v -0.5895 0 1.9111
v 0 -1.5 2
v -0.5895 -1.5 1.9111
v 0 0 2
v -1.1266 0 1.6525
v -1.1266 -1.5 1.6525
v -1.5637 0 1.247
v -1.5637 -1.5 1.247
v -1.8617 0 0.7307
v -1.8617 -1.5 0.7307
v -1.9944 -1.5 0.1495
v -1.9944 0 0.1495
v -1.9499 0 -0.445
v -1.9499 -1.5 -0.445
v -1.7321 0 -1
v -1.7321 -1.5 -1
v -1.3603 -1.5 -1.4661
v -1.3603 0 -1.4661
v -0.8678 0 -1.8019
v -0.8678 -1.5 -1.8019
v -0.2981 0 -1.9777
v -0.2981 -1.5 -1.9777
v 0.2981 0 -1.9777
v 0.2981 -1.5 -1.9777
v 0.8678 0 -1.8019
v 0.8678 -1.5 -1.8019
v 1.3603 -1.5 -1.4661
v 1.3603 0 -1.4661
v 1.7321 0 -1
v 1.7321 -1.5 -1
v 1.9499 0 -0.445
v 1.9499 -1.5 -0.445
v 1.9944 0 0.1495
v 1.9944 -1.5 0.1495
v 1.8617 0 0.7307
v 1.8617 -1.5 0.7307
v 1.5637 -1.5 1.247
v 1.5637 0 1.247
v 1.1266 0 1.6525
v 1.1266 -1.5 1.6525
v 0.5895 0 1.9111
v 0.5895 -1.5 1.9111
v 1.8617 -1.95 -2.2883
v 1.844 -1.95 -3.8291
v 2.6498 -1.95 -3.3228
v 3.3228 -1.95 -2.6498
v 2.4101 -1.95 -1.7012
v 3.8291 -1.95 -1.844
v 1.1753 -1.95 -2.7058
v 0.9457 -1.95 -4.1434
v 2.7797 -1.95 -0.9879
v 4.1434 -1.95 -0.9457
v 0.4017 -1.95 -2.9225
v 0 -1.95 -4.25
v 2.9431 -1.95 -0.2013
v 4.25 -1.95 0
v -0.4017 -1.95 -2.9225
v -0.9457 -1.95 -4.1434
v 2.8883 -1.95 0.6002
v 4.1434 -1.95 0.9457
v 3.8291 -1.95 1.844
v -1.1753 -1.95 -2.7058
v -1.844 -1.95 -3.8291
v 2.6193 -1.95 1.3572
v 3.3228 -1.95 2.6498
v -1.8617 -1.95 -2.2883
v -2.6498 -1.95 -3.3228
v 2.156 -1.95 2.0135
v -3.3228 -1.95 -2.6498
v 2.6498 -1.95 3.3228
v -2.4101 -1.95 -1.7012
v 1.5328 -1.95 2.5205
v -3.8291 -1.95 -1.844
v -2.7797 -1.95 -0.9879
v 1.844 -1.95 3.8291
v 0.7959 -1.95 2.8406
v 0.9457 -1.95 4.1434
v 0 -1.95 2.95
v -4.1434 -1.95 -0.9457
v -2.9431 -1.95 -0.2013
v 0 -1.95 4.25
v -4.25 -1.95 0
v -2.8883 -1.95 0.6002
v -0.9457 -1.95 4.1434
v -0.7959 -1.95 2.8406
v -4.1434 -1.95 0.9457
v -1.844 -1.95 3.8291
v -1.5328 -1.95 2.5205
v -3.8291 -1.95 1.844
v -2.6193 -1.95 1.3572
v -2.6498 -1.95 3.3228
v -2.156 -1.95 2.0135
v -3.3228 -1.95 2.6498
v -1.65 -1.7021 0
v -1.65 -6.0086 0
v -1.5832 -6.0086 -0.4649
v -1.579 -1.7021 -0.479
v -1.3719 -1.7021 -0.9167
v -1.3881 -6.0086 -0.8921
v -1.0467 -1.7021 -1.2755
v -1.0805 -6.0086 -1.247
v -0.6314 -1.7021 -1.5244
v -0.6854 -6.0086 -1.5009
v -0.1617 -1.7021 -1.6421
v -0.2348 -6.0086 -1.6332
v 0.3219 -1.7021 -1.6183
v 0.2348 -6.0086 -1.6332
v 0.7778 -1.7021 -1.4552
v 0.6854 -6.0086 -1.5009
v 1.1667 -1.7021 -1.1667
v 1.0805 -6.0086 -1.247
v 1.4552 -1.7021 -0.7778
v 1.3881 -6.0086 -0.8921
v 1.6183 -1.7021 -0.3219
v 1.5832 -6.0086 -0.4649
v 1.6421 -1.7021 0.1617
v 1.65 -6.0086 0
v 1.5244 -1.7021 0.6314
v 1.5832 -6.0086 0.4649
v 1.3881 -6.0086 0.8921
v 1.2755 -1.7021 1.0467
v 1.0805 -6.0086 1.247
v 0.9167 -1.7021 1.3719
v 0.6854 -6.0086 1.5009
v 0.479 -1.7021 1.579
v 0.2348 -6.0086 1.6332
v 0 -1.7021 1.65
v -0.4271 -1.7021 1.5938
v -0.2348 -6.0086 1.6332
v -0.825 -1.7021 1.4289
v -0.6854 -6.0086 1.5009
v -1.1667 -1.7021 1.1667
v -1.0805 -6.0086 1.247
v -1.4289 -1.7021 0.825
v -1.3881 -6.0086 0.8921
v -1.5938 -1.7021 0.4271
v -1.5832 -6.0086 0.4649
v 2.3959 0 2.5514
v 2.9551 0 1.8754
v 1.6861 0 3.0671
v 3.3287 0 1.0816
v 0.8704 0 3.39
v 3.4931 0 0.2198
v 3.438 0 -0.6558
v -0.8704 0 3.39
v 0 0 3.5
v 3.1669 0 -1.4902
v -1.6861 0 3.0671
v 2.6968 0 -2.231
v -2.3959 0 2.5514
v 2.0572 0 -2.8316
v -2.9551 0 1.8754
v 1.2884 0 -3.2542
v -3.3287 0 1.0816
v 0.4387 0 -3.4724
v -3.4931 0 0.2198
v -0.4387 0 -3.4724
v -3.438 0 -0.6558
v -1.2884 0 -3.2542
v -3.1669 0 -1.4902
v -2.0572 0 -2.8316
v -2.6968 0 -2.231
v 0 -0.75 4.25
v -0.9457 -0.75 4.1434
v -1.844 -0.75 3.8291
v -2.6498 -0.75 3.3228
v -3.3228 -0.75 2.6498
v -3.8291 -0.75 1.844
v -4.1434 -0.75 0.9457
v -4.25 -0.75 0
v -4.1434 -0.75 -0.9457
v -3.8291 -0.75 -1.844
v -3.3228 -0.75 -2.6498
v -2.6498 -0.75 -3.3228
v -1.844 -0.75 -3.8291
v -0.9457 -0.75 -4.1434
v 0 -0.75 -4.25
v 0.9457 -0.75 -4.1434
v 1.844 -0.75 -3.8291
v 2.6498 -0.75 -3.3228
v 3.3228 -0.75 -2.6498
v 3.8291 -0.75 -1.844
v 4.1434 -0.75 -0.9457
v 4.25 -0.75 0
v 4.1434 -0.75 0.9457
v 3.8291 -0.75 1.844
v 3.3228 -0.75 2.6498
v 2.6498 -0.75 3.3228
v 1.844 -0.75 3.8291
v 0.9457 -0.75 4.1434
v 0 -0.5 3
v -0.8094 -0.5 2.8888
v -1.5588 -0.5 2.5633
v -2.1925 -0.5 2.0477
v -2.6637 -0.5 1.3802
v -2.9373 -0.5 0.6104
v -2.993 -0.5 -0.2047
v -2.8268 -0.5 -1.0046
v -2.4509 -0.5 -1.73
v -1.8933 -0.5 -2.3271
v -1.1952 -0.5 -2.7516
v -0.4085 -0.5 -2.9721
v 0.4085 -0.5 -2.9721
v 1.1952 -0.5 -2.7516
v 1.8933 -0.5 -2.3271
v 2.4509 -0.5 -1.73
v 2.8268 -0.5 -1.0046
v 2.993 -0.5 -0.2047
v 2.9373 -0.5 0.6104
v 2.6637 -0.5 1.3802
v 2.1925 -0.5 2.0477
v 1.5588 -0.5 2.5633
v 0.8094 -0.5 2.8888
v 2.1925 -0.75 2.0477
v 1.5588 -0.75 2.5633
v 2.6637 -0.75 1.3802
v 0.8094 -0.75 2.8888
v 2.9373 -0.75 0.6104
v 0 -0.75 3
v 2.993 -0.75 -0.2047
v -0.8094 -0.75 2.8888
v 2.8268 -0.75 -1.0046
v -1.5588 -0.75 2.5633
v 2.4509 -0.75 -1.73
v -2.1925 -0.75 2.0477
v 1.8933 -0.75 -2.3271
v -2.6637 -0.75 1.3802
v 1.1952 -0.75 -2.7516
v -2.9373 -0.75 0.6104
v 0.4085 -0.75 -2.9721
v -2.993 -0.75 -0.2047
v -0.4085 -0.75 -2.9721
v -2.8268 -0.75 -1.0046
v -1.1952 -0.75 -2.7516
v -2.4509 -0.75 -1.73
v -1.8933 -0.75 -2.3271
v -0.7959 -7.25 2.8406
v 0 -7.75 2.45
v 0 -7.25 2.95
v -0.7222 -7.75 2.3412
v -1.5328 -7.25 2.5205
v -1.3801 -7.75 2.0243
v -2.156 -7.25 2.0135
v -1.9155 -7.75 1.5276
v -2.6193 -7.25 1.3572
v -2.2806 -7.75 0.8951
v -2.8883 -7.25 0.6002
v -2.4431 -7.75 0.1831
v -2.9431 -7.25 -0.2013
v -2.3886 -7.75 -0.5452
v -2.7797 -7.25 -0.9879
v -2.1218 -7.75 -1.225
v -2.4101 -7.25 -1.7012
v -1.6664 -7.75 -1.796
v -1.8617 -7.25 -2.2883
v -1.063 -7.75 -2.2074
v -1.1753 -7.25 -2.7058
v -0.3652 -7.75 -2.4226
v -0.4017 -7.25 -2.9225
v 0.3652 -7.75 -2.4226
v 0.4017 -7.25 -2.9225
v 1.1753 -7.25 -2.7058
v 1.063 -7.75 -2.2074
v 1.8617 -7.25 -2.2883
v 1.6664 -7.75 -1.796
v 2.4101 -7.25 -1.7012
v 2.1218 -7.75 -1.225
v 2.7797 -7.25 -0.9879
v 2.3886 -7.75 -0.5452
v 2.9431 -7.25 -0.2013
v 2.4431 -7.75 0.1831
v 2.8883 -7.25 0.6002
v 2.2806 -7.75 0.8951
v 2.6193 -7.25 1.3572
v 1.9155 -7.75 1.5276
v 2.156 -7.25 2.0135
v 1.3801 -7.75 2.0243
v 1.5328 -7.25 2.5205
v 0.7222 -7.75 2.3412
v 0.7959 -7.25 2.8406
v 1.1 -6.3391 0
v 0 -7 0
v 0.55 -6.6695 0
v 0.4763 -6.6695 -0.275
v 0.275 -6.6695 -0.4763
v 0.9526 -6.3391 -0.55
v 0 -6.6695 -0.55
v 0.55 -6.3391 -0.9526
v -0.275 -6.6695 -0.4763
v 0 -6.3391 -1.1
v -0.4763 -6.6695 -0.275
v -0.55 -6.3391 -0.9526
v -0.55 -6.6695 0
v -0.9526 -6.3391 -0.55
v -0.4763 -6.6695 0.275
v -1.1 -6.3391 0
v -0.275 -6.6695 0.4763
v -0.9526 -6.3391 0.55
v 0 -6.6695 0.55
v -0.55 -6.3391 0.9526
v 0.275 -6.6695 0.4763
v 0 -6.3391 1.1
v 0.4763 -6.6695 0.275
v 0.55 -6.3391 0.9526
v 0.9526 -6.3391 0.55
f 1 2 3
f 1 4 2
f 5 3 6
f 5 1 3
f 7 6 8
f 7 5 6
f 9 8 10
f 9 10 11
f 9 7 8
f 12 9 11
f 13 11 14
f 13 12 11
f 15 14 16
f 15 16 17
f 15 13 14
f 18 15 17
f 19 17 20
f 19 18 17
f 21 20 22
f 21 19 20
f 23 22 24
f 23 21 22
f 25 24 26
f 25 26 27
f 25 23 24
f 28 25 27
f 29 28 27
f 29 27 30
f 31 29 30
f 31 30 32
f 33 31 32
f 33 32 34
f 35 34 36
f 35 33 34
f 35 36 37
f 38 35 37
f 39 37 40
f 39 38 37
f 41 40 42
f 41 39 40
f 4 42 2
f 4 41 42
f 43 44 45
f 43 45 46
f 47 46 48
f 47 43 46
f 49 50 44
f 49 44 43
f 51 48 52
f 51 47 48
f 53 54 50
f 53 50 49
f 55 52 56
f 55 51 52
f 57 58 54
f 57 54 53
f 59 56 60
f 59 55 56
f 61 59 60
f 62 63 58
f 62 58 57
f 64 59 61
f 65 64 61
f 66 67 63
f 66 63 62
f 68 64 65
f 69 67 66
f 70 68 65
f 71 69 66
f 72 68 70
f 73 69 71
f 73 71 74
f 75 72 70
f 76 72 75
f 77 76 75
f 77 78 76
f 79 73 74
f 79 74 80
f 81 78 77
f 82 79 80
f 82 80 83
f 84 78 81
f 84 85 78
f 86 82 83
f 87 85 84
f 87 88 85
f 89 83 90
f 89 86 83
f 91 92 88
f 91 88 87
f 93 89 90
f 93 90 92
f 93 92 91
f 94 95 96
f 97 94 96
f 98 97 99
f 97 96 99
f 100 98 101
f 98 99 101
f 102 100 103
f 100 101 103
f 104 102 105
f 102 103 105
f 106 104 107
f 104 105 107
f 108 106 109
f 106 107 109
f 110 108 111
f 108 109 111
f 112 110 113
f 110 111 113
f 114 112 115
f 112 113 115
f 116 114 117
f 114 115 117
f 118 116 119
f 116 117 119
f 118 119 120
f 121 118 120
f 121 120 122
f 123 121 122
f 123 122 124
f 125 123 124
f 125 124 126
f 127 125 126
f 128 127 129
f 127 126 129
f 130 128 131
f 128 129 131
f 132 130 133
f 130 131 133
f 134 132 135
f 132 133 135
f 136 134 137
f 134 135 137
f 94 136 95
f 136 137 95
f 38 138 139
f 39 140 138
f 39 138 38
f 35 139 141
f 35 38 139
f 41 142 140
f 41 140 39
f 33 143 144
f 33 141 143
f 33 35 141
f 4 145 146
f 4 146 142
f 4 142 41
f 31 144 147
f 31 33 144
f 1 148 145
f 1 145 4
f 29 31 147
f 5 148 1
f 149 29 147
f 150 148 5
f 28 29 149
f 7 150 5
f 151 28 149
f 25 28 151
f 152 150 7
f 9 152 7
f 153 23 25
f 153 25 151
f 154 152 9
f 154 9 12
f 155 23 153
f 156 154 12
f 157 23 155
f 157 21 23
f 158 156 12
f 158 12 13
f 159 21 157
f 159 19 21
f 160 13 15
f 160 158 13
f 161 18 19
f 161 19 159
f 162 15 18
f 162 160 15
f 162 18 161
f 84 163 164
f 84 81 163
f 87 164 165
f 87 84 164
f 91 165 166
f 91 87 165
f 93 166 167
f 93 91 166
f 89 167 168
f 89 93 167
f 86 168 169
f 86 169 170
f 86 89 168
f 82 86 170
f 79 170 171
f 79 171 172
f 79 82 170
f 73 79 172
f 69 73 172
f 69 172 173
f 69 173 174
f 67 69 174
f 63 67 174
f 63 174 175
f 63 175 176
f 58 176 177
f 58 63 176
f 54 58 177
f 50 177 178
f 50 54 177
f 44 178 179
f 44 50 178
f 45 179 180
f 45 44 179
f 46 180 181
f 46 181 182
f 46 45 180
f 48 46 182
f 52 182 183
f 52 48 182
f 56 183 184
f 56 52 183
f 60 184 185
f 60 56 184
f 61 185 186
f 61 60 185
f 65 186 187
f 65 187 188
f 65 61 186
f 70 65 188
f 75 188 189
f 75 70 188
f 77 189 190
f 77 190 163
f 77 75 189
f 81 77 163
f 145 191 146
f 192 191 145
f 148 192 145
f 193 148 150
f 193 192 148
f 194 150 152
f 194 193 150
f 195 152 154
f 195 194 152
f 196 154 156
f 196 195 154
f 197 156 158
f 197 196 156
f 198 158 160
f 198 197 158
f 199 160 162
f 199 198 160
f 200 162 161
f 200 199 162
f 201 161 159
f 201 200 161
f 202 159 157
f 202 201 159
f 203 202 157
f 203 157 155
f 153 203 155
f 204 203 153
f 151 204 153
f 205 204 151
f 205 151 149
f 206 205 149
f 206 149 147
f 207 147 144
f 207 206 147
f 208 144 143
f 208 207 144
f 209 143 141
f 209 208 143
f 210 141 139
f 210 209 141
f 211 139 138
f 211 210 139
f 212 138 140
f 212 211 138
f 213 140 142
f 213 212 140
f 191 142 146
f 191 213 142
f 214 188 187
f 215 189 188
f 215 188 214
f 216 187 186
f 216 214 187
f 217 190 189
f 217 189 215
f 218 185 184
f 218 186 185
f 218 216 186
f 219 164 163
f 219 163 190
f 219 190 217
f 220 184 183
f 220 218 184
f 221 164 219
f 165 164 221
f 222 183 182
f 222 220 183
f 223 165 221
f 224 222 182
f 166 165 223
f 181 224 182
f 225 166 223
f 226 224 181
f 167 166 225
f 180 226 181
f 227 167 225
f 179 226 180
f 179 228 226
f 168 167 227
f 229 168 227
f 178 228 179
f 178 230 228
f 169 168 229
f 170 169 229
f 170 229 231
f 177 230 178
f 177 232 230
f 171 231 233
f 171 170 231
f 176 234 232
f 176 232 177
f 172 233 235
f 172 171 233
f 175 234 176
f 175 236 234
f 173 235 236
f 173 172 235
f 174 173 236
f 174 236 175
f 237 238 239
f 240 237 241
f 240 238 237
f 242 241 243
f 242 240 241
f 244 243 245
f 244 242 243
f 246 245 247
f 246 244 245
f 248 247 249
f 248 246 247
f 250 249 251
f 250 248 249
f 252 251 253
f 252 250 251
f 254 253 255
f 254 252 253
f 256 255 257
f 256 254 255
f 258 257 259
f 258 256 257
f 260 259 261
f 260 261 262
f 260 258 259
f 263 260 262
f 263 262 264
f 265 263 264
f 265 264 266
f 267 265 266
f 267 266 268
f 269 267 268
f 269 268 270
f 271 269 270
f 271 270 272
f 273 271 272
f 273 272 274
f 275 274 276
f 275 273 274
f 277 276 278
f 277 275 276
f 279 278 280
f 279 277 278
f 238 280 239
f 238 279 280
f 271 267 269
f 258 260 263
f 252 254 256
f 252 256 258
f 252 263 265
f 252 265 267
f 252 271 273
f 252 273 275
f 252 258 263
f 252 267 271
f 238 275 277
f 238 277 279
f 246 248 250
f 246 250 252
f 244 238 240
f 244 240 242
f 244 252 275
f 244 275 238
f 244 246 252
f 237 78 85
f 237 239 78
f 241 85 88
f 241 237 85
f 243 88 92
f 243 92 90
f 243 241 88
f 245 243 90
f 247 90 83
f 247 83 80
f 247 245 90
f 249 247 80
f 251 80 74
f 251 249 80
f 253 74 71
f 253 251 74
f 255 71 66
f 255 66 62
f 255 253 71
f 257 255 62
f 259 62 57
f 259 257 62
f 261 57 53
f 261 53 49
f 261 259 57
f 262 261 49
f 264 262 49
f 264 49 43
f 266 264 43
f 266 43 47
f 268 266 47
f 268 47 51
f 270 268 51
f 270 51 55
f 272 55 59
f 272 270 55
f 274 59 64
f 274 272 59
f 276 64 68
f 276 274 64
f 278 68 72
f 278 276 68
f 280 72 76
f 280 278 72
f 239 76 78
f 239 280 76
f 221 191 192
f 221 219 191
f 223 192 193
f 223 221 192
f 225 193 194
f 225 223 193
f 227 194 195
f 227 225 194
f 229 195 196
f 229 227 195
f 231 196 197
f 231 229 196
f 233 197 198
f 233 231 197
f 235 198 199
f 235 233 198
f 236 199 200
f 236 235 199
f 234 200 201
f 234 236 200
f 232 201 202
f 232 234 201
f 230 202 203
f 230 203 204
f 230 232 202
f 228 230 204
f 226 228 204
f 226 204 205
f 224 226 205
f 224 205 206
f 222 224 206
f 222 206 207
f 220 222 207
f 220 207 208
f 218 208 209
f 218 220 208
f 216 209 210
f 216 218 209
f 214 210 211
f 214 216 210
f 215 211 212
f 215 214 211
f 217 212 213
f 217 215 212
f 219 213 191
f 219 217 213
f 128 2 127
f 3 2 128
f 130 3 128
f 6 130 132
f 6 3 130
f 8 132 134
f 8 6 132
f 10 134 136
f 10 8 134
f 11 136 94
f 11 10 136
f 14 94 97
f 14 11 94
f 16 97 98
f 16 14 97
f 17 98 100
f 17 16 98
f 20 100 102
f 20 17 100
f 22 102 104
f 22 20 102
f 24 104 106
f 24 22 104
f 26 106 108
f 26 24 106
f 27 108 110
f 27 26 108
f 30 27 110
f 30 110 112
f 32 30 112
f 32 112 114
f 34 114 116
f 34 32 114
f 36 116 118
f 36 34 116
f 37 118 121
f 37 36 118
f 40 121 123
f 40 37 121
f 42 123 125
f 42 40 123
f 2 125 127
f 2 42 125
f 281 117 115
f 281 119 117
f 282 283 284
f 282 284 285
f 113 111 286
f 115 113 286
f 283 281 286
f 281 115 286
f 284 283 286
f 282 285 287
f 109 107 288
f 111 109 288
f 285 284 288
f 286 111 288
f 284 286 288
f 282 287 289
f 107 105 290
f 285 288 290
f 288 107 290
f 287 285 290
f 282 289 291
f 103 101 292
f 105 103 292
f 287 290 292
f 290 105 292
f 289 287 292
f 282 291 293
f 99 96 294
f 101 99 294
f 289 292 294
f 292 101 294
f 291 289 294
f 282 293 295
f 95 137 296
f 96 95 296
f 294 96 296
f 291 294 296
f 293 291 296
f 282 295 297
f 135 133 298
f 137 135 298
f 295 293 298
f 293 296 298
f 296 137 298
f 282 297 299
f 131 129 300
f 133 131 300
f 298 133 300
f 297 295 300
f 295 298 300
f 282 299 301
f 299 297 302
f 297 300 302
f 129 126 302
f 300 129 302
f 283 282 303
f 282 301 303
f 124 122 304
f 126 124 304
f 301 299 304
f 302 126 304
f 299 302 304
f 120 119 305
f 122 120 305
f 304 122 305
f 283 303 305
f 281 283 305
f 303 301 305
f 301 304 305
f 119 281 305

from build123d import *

# Parameters (mm, degrees)
BROCA_DE_ROSQUEAR_PARA_TARRAXA_DE_M41_D     = 3.3
BROCA_DE_ROSQUEAR_PARA_TARRAXA_DE_M41_DEPTH = 6.008579979
BROCA_DE_ROSQUEAR_PARA_TARRAXA_DE_M41_TIP   = 0.991420021


with BuildPart() as part:
    # Esboço1 → Revolução1 (revolve)
    with BuildSketch(Plane.XY, mode=Mode.PRIVATE) as revolu_o1_sk:
        Polygon((-2, 0), (-3.5, 0), (-3, -0.5), (-3, -0.75), (-4.25, -0.75), (-4.25, -1.95), (-2.95, -1.95), (-2.95, -7.25), (-2.45, -7.75), (0, -7.75), (0, -2), (-1.133974596, -2), (-2, -1.5), align=None)
    revolve(revolu_o1_sk.sketch.rotate(Axis((0, -2, 0), (0, -1, 0)), 270), axis=Axis((0, -2, 0), (0, -1, 0)))

    # Broca de rosquear para tarraxa de M41
    with Locations(Plane(origin=(0, 0, 0), x_dir=(1, 0, 0), z_dir=(0, 1, 0))):
        with Locations((0, 0)):
            Hole(BROCA_DE_ROSQUEAR_PARA_TARRAXA_DE_M41_D / 2, depth=BROCA_DE_ROSQUEAR_PARA_TARRAXA_DE_M41_DEPTH)
            with Locations((0, 0, -(BROCA_DE_ROSQUEAR_PARA_TARRAXA_DE_M41_DEPTH + BROCA_DE_ROSQUEAR_PARA_TARRAXA_DE_M41_TIP / 2))):  # 118° drill point
                Cone(0, BROCA_DE_ROSQUEAR_PARA_TARRAXA_DE_M41_D / 2, BROCA_DE_ROSQUEAR_PARA_TARRAXA_DE_M41_TIP, mode=Mode.SUBTRACT)


solid = part.part
